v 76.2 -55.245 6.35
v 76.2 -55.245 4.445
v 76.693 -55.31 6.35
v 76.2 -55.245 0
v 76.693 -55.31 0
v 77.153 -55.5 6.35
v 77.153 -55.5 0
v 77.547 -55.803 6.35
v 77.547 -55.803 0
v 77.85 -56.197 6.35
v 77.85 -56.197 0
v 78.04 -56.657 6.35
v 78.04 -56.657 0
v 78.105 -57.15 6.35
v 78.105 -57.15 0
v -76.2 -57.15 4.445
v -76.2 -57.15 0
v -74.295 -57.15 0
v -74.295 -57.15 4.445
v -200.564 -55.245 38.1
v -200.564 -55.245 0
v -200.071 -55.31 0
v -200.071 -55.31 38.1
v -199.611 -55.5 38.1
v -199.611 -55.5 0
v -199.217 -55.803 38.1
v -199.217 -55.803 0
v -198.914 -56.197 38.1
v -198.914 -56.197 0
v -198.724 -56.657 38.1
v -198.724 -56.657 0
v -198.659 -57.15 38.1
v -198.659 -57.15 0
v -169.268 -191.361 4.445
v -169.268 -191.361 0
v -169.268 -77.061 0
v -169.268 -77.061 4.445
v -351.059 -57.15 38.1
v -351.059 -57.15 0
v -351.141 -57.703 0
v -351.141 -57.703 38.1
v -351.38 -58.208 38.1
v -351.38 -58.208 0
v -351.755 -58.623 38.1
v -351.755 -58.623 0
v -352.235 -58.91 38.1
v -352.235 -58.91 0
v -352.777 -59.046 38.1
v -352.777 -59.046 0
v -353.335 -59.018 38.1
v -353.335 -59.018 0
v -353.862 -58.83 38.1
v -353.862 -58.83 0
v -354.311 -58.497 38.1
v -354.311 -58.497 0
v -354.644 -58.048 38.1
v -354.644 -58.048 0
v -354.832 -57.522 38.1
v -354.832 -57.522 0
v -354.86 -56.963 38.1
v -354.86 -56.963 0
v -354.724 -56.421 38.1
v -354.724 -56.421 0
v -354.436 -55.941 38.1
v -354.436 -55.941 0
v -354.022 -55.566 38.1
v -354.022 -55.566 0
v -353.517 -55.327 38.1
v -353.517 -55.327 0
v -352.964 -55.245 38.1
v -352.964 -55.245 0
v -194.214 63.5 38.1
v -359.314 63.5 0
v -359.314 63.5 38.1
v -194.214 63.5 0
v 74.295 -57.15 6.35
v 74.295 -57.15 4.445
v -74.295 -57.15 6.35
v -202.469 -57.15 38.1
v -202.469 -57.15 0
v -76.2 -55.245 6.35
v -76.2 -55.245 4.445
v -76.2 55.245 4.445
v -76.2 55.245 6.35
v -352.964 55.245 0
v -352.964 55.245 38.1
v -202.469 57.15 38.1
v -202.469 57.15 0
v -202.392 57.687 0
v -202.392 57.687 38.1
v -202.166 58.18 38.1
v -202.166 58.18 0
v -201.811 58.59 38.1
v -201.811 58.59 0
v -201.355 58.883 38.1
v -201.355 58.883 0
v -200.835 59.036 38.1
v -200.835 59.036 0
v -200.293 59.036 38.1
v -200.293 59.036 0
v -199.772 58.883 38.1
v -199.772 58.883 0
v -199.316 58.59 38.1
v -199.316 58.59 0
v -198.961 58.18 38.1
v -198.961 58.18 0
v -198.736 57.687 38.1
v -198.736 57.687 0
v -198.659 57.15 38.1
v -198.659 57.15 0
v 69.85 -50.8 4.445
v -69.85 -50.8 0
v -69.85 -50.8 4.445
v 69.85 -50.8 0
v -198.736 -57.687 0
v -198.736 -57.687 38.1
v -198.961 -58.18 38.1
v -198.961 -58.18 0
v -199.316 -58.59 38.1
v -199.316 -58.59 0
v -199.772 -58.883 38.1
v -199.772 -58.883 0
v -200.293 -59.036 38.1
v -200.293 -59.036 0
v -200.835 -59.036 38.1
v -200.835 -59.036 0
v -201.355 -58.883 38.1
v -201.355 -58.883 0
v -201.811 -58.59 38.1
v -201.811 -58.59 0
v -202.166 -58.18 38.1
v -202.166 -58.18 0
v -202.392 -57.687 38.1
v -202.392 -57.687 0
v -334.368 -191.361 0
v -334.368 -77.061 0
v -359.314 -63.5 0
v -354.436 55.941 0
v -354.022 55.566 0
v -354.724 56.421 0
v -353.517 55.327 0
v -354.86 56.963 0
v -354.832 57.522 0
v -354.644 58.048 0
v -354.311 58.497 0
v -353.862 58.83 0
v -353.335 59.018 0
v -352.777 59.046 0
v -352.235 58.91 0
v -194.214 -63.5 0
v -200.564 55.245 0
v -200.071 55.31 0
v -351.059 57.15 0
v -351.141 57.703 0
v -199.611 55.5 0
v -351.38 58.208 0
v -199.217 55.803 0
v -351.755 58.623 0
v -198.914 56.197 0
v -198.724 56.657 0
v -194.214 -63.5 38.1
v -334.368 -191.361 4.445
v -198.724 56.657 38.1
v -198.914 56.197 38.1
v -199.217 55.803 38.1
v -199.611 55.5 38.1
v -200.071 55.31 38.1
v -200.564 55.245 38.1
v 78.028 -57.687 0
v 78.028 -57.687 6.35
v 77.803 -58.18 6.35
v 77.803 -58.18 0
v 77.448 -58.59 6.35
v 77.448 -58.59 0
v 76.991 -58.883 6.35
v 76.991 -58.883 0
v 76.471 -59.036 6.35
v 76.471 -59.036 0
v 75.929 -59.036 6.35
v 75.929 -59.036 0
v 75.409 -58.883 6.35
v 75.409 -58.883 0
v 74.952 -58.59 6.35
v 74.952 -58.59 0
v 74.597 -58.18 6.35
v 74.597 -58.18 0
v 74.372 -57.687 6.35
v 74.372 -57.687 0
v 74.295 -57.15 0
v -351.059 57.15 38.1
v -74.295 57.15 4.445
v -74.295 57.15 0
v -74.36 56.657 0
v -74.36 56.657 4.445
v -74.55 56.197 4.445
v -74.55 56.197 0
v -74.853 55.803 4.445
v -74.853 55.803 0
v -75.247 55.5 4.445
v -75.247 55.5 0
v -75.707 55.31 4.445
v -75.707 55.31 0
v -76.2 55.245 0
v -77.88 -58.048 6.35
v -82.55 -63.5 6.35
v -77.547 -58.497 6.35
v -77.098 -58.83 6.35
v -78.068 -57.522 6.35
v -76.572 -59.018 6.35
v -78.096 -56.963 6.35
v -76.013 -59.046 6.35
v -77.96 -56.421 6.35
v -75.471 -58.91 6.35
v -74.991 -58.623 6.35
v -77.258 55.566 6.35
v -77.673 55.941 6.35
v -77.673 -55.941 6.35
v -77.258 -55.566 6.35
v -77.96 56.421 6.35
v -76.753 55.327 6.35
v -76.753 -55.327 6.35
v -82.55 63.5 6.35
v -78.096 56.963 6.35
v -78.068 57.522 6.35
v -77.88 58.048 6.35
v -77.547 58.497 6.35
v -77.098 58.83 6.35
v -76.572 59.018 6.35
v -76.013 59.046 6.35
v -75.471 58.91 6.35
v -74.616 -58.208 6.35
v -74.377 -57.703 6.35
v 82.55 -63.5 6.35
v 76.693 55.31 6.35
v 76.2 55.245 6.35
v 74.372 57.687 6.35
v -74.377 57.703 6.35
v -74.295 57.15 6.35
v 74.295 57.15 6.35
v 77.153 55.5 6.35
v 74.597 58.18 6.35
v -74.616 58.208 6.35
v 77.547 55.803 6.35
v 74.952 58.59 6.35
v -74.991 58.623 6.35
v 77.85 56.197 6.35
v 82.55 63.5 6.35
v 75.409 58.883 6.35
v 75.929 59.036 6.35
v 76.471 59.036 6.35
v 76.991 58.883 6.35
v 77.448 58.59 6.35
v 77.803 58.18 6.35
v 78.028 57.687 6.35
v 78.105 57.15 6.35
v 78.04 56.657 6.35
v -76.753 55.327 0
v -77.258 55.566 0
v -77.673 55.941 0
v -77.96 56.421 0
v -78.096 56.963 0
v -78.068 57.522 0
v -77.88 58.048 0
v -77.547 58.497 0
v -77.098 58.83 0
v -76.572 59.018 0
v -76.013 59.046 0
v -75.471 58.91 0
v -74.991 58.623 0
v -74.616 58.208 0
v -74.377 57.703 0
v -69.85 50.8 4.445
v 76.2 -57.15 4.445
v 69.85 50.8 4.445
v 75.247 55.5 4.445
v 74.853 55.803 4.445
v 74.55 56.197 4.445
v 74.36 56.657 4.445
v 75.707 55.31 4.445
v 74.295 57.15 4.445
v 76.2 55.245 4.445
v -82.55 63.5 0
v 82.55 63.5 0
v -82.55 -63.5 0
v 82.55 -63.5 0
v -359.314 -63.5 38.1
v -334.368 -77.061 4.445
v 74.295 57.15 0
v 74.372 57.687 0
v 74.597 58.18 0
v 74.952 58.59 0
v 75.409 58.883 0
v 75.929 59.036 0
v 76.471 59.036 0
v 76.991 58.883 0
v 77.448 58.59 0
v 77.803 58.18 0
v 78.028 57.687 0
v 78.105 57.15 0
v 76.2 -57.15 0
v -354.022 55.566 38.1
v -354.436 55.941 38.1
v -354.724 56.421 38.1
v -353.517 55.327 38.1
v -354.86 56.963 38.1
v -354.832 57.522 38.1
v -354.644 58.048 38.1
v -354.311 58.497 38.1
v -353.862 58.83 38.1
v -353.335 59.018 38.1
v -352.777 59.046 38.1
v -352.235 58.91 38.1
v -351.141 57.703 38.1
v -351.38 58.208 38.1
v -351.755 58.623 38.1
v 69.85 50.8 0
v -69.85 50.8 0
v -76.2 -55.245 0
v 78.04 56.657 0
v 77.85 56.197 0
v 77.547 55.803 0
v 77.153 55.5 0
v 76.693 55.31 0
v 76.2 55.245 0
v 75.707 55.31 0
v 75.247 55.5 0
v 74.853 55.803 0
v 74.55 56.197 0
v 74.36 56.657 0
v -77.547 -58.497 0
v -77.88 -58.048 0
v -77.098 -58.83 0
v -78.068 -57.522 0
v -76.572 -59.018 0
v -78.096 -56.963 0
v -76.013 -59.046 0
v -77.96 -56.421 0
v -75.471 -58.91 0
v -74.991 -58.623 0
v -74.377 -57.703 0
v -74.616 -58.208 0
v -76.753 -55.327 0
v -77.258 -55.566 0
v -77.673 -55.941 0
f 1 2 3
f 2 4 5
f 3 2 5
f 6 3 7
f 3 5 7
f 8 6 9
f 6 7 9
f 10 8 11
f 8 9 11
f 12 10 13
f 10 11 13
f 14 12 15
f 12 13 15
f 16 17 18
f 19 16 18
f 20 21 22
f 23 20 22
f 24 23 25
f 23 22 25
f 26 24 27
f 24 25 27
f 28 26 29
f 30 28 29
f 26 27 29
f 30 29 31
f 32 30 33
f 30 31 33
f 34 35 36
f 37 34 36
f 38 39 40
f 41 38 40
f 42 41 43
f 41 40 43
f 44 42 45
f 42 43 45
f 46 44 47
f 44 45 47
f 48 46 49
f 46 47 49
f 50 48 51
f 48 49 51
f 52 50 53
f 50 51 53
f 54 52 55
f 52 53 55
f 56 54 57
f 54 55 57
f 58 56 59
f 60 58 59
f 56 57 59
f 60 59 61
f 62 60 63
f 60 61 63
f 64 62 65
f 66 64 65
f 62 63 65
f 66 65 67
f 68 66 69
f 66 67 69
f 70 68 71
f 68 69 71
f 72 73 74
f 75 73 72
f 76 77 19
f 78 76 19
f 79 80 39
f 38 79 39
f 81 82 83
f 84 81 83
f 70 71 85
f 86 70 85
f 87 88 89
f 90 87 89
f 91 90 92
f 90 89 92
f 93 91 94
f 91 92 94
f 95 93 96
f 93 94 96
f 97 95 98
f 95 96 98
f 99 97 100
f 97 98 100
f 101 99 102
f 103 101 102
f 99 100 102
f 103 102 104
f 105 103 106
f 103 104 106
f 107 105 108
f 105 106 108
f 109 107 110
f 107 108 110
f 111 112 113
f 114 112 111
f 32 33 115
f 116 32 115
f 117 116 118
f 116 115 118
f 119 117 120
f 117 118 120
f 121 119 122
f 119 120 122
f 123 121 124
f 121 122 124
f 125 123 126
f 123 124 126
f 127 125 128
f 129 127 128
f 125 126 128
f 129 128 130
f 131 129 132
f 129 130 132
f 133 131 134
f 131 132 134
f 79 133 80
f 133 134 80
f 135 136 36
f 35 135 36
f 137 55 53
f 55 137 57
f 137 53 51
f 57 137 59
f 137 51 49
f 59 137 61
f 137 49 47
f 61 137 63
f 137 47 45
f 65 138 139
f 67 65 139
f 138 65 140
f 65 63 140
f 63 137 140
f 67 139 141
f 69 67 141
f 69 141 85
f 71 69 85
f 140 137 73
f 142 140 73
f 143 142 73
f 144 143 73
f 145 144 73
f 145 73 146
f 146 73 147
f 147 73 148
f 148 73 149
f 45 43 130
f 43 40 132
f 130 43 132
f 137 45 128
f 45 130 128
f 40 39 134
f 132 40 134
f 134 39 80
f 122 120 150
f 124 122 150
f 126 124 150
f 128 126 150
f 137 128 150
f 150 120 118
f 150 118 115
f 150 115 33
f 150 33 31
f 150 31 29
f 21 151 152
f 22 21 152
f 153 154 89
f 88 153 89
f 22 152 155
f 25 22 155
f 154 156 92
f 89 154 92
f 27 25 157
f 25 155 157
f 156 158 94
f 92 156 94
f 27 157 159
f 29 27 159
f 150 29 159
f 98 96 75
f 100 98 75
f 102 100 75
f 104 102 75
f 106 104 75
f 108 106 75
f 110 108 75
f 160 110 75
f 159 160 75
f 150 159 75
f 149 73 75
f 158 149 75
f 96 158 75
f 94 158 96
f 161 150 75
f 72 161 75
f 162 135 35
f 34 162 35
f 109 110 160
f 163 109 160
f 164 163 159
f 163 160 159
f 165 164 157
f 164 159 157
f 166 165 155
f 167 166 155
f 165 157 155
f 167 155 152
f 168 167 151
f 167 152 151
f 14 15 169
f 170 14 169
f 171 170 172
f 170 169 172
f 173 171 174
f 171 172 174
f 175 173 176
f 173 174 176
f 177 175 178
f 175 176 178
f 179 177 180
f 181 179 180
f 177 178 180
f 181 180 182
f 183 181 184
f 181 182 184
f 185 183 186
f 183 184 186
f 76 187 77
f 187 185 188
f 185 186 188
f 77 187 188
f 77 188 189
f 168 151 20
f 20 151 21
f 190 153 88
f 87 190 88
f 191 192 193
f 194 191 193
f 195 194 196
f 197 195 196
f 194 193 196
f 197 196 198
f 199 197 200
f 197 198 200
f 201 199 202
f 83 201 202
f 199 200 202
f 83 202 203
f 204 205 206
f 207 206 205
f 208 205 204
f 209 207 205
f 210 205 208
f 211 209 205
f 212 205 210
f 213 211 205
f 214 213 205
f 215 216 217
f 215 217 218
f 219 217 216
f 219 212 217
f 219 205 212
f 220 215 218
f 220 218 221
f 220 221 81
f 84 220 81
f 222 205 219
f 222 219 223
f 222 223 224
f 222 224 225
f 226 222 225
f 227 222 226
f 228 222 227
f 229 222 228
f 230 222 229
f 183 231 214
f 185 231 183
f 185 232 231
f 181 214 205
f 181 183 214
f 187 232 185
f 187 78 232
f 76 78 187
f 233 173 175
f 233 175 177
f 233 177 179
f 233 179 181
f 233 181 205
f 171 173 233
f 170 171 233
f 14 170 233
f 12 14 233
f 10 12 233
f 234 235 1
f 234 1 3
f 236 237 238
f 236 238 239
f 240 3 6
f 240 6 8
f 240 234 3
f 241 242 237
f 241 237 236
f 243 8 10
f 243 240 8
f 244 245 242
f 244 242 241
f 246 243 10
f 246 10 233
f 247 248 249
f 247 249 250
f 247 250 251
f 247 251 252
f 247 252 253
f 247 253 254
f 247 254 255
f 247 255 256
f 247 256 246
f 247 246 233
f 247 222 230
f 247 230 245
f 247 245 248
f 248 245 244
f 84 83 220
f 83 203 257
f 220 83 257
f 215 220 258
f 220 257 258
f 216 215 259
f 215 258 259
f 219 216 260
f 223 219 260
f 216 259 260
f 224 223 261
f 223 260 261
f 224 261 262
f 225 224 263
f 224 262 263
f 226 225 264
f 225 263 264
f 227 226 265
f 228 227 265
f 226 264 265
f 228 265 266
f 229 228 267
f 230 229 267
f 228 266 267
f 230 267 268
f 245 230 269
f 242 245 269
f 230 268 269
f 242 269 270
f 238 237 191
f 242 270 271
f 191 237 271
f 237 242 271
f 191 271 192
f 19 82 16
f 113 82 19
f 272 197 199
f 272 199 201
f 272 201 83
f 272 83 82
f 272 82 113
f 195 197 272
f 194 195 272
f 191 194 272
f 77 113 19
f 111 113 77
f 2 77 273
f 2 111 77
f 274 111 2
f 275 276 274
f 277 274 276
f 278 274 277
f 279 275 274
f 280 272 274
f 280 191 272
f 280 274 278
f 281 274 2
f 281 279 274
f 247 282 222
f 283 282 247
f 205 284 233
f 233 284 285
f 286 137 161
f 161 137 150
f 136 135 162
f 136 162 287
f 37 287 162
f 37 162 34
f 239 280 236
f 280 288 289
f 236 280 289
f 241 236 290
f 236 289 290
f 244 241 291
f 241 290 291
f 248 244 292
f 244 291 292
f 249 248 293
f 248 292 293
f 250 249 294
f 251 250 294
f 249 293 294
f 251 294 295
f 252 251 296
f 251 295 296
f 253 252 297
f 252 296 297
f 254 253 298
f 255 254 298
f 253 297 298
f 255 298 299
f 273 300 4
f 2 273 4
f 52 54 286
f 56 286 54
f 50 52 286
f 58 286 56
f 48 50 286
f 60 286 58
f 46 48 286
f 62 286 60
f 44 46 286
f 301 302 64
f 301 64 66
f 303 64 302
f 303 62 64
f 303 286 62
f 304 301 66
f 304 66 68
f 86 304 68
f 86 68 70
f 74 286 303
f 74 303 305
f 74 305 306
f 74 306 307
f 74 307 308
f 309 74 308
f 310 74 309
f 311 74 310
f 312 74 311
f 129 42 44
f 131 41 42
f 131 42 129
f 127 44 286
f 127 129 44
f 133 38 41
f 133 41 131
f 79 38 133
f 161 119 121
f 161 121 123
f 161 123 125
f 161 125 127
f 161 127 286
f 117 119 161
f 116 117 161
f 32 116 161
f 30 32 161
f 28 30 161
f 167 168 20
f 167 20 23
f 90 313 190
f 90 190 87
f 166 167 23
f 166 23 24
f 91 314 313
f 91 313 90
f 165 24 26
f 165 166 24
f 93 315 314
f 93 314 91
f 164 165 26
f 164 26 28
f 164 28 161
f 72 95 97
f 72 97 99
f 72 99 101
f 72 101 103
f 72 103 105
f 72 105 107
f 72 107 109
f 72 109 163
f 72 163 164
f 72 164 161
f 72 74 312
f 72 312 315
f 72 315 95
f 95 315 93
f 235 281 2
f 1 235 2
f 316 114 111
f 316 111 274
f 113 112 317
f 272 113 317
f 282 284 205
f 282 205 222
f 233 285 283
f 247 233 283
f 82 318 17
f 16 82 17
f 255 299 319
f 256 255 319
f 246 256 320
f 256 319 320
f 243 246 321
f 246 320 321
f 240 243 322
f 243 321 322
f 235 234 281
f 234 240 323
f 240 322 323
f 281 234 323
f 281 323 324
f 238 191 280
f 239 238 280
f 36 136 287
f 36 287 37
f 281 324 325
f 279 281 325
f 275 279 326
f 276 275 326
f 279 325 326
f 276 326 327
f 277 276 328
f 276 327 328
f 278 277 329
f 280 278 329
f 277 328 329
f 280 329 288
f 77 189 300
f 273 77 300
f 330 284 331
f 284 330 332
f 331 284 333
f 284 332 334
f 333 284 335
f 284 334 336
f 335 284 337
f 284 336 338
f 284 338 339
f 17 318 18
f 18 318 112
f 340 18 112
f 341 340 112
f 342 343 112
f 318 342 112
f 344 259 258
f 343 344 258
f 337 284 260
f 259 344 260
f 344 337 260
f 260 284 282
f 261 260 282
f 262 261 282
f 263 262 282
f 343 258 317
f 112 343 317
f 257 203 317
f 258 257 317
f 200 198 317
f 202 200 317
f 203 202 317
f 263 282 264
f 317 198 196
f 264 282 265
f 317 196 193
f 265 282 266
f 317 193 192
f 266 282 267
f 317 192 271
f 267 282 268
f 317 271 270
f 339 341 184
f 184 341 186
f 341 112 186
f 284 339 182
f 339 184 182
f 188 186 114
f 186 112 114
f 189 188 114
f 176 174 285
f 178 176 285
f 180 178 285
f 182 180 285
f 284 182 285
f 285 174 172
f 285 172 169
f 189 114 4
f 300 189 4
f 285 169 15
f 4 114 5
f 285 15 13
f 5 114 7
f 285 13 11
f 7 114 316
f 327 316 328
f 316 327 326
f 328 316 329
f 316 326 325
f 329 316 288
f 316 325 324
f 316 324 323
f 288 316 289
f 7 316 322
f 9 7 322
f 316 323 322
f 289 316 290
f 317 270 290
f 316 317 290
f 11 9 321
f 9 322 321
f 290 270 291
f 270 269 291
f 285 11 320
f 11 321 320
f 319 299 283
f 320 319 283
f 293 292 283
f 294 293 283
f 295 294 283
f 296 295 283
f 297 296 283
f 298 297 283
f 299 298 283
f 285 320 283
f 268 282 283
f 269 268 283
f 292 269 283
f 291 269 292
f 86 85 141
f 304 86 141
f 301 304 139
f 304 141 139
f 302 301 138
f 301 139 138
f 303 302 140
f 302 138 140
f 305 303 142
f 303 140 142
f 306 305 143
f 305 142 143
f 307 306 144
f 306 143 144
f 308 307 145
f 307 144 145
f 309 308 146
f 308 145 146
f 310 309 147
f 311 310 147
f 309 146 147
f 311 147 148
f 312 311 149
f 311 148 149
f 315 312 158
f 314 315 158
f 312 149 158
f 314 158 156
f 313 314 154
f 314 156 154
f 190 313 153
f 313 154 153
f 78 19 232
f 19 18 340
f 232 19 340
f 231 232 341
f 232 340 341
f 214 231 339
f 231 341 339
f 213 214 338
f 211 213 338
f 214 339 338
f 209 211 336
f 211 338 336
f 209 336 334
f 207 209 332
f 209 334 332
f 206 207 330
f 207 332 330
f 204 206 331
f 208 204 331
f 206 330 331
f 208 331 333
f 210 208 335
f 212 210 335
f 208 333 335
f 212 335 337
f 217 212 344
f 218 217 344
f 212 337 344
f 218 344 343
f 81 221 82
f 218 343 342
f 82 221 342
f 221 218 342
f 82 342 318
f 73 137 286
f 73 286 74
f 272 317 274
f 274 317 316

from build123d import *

# Parameters (mm, degrees)
F0_W     = 139.7
F0_H     = 101.6
F1_DEPTH = 4.445
F0_W_2   = 165.1
F0_H_2   = 127
F2_DEPTH = 6.35
F3_W     = 165.1
F3_H     = 127
F4_DEPTH = 38.1
F5_W     = 165.1
F5_H     = 114.3
F6_DEPTH = 4.445


with BuildPart() as f1:
    # F0 (on Top) → F1 (new body)
    with BuildSketch(Plane.XY):
        with BuildLine():
            ThreePointArc((76.2, -55.245), (74.8529615818, -55.8029615818), (74.295, -57.15))
            Line((74.295, -57.15), (76.2, -57.15))
            Line((76.2, -57.15), (76.2, -55.245))
        make_face()
        with BuildLine():
            ThreePointArc((-76.2, -55.245), (-74.8529615818, -55.8029615818), (-74.295, -57.15))
            Line((-74.295, -57.15), (74.295, -57.15))
            ThreePointArc((74.295, -57.15), (74.8529615818, -55.8029615818), (76.2, -55.245))
            Line((76.2, -55.245), (76.2, 55.245))
            ThreePointArc((76.2, 55.245), (74.8529615818, 55.8029615818), (74.295, 57.15))
            Line((74.295, 57.15), (-74.295, 57.15))
            ThreePointArc((-74.295, 57.15), (-74.8529615818, 55.8029615818), (-76.2, 55.245))
            Line((-76.2, 55.245), (-76.2, -55.245))
        make_face()
        Rectangle(F0_W, F0_H, mode=Mode.SUBTRACT)
        with BuildLine():
            Line((-76.2, -57.15), (-74.295, -57.15))
            ThreePointArc((-74.295, -57.15), (-74.8529615818, -55.8029615818), (-76.2, -55.245))
            Line((-76.2, -55.245), (-76.2, -57.15))
        make_face()
    extrude(amount=F1_DEPTH)

    # F0 (on Top) → F2 (join)
    with BuildSketch(Plane.XY):
        Rectangle(F0_W_2, F0_H_2)
        with BuildLine():
            Line((74.295, -57.15), (-74.295, -57.15))
            ThreePointArc((-74.295, -57.15), (-77.5470384182, -58.4970384182), (-76.2, -55.245))
            Line((-76.2, -55.245), (-76.2, 55.245))
            ThreePointArc((-76.2, 55.245), (-77.5470384182, 58.4970384182), (-74.295, 57.15))
            Line((-74.295, 57.15), (74.295, 57.15))
            ThreePointArc((74.295, 57.15), (76.2, 59.055), (78.105, 57.15))
            ThreePointArc((78.105, 57.15), (77.5470384182, 55.8029615818), (76.2, 55.245))
            Line((76.2, 55.245), (76.2, -55.245))
            ThreePointArc((76.2, -55.245), (77.5470384182, -55.8029615818), (78.105, -57.15))
            ThreePointArc((78.105, -57.15), (76.2, -59.055), (74.295, -57.15))
        make_face(mode=Mode.SUBTRACT)
    extrude(amount=F2_DEPTH)


with BuildPart() as f4:
    # F3 (on Top) → F4 (new body)
    with BuildSketch(Plane.XY):
        with Locations((-276.7637000168, 0)):
            Rectangle(F3_W, F3_H)
        with BuildLine():
            Line((-202.4687000168, -57.15), (-351.0587000168, -57.15))
            ThreePointArc((-351.0587000168, -57.15), (-354.3107384349, -58.4970384182), (-352.9637000168, -55.245))
            Line((-352.9637000168, -55.245), (-352.9637000168, 55.245))
            ThreePointArc((-352.9637000168, 55.245), (-354.3107384349, 58.4970384182), (-351.0587000168, 57.15))
            Line((-351.0587000168, 57.15), (-202.4687000168, 57.15))
            ThreePointArc((-202.4687000168, 57.15), (-200.5637000168, 59.055), (-198.6587000168, 57.15))
            ThreePointArc((-198.6587000168, 57.15), (-199.2166615986, 55.8029615818), (-200.5637000168, 55.245))
            Line((-200.5637000168, 55.245), (-200.5637000168, -55.245))
            ThreePointArc((-200.5637000168, -55.245), (-199.2166615986, -55.8029615818), (-198.6587000168, -57.15))
            ThreePointArc((-198.6587000168, -57.15), (-200.5637000168, -59.055), (-202.4687000168, -57.15))
        make_face(mode=Mode.SUBTRACT)
    extrude(amount=F4_DEPTH)


with BuildPart() as f6:
    # F5 (on Top) → F6 (new body)
    with BuildSketch(Plane.XY):
        with Locations((-251.817983162, -134.2107951641)):
            Rectangle(F5_W, F5_H)
    extrude(amount=F6_DEPTH)


solid = Compound([f1.part, f4.part, f6.part])
